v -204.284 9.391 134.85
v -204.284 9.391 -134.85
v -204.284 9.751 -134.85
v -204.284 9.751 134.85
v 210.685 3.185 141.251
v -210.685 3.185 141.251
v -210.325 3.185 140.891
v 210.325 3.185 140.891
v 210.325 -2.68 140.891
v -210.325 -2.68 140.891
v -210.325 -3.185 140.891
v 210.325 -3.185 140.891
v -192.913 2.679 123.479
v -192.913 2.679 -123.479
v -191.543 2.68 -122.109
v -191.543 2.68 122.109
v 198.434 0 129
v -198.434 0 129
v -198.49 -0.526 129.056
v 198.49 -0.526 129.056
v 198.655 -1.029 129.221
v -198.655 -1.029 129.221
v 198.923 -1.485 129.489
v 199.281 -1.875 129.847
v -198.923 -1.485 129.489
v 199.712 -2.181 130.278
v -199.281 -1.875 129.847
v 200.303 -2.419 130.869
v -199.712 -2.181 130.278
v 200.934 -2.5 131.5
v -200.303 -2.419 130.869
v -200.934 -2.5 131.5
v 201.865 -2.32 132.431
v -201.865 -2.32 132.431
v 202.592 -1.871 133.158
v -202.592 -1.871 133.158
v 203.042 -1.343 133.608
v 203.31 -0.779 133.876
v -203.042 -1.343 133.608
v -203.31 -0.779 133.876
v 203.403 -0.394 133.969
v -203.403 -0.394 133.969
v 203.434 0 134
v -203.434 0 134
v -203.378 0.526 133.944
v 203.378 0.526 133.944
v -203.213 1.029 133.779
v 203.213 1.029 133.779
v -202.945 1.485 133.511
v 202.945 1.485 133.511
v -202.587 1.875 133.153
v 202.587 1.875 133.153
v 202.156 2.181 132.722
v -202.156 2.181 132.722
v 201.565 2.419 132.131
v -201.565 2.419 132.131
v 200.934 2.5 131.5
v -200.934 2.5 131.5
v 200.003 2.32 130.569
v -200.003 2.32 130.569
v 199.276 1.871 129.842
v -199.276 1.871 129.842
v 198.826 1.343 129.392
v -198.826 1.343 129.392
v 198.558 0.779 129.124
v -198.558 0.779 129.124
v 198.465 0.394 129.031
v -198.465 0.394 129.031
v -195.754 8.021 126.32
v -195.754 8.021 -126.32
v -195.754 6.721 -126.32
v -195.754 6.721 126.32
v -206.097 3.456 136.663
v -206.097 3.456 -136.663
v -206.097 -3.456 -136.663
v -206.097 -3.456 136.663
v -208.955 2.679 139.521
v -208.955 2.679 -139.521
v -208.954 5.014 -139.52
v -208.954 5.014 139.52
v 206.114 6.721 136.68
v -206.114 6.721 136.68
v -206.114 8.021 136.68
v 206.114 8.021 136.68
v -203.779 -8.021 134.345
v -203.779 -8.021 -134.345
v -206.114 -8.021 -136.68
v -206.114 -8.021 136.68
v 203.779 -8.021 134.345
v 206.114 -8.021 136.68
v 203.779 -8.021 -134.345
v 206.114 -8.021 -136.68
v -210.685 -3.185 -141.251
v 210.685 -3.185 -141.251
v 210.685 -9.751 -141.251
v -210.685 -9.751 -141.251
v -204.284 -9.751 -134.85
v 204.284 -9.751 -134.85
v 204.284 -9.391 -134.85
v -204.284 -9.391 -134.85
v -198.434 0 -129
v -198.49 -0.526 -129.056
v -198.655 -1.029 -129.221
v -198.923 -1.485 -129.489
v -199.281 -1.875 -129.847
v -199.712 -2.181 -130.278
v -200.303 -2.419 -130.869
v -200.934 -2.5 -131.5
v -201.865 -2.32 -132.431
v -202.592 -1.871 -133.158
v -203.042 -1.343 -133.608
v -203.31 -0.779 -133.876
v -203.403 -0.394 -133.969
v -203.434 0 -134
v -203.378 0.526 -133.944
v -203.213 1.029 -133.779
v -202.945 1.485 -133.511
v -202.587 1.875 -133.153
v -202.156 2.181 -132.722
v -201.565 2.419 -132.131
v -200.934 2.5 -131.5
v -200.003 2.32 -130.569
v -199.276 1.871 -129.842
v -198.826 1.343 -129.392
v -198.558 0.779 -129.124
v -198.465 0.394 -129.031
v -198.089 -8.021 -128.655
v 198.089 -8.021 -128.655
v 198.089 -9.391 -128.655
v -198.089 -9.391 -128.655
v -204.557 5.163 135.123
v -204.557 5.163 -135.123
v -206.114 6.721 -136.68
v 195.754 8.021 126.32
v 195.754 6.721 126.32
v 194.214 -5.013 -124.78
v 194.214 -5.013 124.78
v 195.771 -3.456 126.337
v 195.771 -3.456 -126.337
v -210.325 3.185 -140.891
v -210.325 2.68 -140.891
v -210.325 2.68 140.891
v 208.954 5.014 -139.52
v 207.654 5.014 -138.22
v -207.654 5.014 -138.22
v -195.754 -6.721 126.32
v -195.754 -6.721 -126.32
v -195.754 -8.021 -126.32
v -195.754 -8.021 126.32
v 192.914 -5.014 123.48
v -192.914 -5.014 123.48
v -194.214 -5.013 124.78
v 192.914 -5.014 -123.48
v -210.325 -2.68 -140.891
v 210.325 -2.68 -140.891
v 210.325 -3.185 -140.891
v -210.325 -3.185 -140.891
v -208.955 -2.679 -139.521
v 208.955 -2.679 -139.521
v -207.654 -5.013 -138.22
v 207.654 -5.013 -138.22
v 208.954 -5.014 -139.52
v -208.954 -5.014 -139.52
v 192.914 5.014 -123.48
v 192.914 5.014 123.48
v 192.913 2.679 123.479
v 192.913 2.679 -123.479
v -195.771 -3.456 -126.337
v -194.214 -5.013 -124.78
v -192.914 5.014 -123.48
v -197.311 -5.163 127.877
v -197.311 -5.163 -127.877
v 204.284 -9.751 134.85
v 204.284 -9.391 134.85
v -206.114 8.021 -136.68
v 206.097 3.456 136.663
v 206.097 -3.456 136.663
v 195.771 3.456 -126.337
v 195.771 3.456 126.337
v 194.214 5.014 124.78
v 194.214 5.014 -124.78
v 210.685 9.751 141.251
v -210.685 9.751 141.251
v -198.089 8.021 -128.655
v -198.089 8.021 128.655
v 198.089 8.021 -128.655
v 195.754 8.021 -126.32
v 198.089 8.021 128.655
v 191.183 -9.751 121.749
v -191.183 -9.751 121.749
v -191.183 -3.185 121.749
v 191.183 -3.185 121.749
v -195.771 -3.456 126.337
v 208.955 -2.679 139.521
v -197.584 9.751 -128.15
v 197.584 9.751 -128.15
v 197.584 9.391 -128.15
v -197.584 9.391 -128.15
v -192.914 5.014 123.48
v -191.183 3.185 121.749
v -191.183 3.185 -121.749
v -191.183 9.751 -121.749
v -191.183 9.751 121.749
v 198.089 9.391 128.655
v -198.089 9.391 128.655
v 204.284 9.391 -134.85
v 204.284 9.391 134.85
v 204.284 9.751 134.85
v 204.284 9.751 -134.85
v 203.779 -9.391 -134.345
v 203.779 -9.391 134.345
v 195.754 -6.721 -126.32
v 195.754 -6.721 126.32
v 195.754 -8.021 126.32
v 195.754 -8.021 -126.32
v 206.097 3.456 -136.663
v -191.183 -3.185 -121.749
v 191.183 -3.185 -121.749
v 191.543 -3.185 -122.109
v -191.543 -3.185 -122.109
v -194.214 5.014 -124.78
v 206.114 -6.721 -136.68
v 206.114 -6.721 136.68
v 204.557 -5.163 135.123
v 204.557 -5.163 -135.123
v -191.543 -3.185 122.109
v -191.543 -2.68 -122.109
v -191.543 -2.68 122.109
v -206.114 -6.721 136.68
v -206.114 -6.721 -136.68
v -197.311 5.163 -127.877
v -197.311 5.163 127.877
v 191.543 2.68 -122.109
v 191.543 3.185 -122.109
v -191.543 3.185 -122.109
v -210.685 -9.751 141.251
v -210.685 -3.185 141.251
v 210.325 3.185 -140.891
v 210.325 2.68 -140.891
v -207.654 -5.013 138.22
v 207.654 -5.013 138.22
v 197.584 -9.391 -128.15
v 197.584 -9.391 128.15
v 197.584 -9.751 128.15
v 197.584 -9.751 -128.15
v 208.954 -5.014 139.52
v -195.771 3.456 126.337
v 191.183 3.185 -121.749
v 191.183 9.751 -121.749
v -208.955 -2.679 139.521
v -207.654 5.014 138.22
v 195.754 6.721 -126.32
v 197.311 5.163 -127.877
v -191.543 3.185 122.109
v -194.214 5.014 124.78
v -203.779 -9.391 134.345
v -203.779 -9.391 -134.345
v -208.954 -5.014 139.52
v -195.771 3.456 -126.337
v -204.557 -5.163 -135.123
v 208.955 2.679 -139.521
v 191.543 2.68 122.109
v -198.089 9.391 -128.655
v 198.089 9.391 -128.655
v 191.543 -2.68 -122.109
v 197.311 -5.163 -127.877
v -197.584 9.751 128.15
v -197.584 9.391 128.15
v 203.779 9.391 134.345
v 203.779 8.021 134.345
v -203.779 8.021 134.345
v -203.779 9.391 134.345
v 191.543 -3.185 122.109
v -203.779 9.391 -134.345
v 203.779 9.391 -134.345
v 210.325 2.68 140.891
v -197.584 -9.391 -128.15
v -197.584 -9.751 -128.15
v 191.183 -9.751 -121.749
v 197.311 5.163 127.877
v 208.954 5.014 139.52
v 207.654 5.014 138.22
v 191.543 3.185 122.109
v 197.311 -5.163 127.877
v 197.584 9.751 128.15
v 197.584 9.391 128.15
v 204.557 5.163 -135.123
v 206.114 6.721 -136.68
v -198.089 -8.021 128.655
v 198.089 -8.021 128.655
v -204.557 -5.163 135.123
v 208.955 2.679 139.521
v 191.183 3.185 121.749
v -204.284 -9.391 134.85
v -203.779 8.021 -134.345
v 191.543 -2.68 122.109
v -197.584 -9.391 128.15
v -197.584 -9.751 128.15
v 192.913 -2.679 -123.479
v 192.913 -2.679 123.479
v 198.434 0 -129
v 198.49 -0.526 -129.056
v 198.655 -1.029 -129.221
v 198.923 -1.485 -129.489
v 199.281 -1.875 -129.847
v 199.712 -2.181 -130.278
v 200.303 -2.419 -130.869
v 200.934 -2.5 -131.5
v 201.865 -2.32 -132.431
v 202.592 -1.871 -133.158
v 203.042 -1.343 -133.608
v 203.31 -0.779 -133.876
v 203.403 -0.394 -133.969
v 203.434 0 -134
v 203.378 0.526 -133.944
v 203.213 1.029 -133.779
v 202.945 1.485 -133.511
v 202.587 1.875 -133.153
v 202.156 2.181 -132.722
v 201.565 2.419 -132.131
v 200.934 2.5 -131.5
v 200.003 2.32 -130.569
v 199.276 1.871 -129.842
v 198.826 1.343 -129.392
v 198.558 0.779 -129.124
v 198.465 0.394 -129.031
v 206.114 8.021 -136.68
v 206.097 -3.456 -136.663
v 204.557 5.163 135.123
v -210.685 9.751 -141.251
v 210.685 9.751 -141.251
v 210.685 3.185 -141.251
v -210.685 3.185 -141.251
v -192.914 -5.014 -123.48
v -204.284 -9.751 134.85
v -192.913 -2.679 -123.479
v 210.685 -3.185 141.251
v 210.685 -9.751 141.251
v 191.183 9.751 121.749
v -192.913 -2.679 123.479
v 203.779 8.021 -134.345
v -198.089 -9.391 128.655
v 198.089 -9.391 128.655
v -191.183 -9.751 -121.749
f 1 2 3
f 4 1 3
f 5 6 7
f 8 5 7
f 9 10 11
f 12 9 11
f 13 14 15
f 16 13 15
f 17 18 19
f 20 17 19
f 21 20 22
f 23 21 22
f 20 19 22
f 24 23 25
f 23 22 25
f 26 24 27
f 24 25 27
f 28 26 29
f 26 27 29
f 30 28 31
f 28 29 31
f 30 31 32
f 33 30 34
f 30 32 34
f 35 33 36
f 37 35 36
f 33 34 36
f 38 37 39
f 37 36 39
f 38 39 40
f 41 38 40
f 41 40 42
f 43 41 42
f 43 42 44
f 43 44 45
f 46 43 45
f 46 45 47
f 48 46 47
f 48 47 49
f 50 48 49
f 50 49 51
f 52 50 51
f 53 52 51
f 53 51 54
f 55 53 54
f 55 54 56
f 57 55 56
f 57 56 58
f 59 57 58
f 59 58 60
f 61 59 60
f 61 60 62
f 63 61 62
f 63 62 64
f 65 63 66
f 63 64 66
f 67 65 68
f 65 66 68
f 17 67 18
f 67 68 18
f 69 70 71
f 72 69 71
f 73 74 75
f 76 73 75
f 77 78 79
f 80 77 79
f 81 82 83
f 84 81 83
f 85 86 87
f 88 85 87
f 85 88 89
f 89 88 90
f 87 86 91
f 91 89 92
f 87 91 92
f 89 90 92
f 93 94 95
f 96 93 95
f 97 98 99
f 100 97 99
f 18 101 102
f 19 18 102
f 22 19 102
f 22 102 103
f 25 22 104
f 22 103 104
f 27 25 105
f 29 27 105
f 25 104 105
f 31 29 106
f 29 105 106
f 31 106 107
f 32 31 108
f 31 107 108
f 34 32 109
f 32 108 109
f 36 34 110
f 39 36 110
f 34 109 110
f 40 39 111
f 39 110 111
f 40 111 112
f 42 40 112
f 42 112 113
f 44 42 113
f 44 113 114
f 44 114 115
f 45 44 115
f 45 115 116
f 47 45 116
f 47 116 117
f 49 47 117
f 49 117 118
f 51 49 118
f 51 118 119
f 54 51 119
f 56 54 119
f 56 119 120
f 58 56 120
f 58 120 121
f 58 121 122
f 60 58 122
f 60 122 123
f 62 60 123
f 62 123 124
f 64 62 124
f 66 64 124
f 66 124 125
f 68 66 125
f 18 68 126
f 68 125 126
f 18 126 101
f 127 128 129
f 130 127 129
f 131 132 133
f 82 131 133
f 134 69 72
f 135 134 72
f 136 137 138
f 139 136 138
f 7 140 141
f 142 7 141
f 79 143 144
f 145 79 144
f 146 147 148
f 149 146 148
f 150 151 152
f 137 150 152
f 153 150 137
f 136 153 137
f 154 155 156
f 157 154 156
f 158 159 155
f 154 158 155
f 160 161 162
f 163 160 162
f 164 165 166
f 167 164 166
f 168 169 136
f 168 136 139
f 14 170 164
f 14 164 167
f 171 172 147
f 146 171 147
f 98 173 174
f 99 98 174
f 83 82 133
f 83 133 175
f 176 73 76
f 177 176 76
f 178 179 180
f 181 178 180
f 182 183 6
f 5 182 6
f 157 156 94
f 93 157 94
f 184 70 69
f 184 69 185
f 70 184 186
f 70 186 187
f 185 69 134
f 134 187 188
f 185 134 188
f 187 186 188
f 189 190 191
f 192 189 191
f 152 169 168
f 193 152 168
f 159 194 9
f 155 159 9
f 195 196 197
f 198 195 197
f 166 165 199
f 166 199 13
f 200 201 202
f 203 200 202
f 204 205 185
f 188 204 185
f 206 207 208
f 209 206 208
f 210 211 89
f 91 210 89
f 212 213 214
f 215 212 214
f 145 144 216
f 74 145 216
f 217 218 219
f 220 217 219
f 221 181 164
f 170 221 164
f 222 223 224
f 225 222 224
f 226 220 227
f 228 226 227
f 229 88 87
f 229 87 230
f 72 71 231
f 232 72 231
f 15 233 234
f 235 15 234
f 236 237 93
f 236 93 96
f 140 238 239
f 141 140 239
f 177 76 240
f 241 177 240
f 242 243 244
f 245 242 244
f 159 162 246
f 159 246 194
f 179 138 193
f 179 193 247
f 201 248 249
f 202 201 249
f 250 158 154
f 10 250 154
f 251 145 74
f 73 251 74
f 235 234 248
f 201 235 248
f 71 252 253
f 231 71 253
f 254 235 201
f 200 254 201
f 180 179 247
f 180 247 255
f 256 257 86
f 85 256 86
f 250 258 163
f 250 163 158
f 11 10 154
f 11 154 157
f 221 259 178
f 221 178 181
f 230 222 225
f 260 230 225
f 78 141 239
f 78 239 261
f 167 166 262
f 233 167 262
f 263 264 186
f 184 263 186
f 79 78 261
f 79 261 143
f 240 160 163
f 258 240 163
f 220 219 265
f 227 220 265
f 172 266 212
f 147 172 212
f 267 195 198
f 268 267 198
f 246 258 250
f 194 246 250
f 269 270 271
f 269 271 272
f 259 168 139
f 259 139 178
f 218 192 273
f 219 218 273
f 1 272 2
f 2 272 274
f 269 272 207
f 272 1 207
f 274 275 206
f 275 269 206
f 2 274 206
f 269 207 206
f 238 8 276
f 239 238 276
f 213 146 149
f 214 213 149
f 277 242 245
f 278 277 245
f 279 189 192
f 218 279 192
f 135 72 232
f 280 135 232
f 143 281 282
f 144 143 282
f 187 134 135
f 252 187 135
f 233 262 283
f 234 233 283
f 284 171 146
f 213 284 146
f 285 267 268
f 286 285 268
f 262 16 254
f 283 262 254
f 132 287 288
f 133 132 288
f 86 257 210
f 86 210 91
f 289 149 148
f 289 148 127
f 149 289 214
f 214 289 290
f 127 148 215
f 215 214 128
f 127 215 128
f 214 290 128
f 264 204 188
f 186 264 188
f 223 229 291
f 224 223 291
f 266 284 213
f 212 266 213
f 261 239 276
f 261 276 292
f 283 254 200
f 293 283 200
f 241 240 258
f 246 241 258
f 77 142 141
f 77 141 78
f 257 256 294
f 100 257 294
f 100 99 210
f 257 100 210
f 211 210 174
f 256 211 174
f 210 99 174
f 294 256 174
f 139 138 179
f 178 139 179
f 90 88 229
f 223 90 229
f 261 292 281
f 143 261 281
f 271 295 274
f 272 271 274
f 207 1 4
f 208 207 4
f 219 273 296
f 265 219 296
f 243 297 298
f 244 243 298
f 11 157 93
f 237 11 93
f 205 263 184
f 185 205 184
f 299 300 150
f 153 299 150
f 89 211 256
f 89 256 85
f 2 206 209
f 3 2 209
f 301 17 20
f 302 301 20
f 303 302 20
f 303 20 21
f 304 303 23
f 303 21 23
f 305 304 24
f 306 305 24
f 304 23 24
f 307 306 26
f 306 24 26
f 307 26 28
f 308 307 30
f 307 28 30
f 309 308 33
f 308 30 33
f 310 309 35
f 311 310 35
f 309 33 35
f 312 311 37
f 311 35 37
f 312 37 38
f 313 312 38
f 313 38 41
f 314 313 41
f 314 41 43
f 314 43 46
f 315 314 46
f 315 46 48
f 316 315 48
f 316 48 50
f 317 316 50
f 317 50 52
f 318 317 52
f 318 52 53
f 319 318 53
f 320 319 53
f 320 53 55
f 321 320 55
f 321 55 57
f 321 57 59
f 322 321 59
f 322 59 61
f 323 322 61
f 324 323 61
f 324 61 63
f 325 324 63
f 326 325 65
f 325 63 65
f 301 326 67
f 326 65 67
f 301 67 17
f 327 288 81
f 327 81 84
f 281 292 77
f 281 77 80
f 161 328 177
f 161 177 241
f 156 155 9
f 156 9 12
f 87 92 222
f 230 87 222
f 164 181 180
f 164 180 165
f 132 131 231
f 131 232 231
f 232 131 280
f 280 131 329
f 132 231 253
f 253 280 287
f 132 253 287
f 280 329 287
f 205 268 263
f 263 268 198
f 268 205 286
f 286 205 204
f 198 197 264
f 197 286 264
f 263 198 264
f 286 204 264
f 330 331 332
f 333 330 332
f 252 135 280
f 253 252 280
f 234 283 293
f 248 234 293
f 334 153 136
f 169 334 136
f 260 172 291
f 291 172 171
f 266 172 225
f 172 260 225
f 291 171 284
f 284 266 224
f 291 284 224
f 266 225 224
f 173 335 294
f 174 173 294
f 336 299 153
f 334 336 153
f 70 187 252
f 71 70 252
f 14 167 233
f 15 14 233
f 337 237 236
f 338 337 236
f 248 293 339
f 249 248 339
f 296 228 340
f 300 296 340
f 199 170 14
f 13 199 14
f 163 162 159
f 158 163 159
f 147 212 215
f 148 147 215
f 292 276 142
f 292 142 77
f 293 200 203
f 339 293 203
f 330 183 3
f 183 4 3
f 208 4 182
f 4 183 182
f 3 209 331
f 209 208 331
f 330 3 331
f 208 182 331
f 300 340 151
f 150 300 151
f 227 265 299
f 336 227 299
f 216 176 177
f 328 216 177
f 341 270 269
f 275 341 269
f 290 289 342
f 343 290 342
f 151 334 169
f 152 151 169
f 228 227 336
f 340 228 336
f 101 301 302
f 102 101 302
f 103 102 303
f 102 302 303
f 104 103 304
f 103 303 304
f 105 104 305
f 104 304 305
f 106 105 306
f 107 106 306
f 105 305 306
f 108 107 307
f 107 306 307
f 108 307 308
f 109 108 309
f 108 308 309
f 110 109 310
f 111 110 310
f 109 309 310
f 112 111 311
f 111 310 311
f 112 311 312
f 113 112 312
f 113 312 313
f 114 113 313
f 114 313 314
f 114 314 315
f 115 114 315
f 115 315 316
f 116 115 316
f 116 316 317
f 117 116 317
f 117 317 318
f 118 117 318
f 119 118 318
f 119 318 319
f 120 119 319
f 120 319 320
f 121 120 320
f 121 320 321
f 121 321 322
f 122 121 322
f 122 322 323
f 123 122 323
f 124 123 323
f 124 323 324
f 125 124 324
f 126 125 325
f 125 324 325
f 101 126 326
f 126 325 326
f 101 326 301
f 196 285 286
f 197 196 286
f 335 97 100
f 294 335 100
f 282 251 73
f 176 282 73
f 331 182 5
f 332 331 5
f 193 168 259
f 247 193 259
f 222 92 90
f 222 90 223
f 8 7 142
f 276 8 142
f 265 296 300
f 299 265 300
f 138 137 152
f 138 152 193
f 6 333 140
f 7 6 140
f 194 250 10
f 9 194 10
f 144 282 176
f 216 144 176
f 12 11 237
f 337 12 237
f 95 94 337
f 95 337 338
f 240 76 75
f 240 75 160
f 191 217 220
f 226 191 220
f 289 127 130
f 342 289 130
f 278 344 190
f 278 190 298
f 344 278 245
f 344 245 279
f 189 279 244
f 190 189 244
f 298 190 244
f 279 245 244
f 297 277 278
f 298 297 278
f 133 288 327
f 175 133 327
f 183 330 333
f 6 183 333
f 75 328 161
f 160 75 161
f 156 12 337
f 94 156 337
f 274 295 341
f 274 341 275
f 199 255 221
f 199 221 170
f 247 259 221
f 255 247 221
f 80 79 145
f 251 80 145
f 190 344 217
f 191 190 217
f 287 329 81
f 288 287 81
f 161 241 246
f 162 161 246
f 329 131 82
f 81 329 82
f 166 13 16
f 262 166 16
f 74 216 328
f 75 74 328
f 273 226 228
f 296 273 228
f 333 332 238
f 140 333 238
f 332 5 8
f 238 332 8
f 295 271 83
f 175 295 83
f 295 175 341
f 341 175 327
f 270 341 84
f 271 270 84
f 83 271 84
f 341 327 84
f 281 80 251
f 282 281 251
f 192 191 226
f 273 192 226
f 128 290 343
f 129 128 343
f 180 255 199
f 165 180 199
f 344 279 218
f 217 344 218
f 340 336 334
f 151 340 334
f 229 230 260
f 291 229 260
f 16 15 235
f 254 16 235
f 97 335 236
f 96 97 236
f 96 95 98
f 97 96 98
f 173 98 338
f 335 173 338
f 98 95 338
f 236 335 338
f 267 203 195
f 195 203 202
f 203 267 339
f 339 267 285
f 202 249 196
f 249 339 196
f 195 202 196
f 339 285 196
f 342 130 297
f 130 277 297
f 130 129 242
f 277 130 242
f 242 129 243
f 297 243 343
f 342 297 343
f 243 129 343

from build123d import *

# Parameters (mm, degrees)
CROQUIS2_R = 2.5


with BuildPart() as part:
    # Barrer1: sweep along a path in Croquis1
    with BuildLine(Plane(origin=(0, 0, 0), x_dir=(1, 0, 0), z_dir=(0, 1, 0))) as barrer1_path:
        Line((-200.934, 131.5), (200.934, 131.5))
        Line((200.934, 131.5), (200.934, -131.5))
        Line((200.934, -131.5), (-200.934, -131.5))
        Line((-200.934, -131.5), (-200.934, 131.5))
    # Croquis2 → Barrer1 (sweep)
    with BuildSketch(Plane(origin=(0, 0, 0), x_dir=(0, 0, -1), z_dir=(1, 0, 0))):
        Polygon((-134.849716447, 9.750635048), (-134.849716447, 9.390635048), (-134.344716447, 9.390635048), (-134.344716447, 8.020635048), (-136.679716447, 8.020635048), (-136.679716447, 6.720635048), (-135.123236313, 5.163216334), (-127.876765738, 5.163216334), (-126.320285605, 6.720635048), (-126.320285605, 8.020635048), (-128.655285605, 8.020635048), (-128.655285605, 9.390635048), (-128.150285605, 9.390635048), (-128.150285605, 9.750635048), (-121.749166204, 9.750635048), (-121.749166204, 3.185392978), (-122.109166138, 3.185175958), (-122.108861707, 2.680176049), (-123.478861458, 2.679350168), (-123.480269074, 5.014349744), (-124.780268838, 5.01356606), (-126.336748971, 3.456147346), (-126.336748971, -3.456060512), (-124.780268838, -5.013479227), (-123.480269074, -5.01426291), (-123.478861458, -2.679263334), (-122.108861707, -2.680089216), (-122.109166138, -3.185089124), (-121.749166204, -3.185306144), (-121.749166204, -9.750548215), (-128.150285605, -9.750548215), (-128.150285605, -9.390548215), (-128.655285605, -9.390548215), (-128.655285605, -8.020548215), (-126.320285605, -8.020548215), (-126.320285605, -6.720548215), (-127.876765738, -5.1631295), (-135.123236313, -5.1631295), (-136.679716447, -6.720548215), (-136.679716447, -8.020548215), (-134.344716447, -8.020548215), (-134.344716447, -9.390548215), (-134.849716447, -9.390548215), (-134.849716447, -9.750548215), (-141.250835848, -9.750548215), (-141.250835848, -3.185306144), (-140.890835913, -3.185089124), (-140.891140344, -2.680089216), (-139.521140593, -2.679263334), (-139.519732977, -5.01426291), (-138.219733214, -5.013479227), (-136.66325308, -3.456060512), (-136.66325308, 3.456147346), (-138.219733214, 5.01356606), (-139.519732977, 5.014349744), (-139.521140593, 2.679350168), (-140.891140344, 2.680176049), (-140.890835913, 3.185175958), (-141.250835848, 3.185392978), (-141.250835848, 9.750635048), align=None)
        with Locations((-131.500001026, 4.3417e-05)):
            Circle(CROQUIS2_R, mode=Mode.SUBTRACT)
    sweep(path=barrer1_path.line, transition=Transition.RIGHT)


solid = part.part
